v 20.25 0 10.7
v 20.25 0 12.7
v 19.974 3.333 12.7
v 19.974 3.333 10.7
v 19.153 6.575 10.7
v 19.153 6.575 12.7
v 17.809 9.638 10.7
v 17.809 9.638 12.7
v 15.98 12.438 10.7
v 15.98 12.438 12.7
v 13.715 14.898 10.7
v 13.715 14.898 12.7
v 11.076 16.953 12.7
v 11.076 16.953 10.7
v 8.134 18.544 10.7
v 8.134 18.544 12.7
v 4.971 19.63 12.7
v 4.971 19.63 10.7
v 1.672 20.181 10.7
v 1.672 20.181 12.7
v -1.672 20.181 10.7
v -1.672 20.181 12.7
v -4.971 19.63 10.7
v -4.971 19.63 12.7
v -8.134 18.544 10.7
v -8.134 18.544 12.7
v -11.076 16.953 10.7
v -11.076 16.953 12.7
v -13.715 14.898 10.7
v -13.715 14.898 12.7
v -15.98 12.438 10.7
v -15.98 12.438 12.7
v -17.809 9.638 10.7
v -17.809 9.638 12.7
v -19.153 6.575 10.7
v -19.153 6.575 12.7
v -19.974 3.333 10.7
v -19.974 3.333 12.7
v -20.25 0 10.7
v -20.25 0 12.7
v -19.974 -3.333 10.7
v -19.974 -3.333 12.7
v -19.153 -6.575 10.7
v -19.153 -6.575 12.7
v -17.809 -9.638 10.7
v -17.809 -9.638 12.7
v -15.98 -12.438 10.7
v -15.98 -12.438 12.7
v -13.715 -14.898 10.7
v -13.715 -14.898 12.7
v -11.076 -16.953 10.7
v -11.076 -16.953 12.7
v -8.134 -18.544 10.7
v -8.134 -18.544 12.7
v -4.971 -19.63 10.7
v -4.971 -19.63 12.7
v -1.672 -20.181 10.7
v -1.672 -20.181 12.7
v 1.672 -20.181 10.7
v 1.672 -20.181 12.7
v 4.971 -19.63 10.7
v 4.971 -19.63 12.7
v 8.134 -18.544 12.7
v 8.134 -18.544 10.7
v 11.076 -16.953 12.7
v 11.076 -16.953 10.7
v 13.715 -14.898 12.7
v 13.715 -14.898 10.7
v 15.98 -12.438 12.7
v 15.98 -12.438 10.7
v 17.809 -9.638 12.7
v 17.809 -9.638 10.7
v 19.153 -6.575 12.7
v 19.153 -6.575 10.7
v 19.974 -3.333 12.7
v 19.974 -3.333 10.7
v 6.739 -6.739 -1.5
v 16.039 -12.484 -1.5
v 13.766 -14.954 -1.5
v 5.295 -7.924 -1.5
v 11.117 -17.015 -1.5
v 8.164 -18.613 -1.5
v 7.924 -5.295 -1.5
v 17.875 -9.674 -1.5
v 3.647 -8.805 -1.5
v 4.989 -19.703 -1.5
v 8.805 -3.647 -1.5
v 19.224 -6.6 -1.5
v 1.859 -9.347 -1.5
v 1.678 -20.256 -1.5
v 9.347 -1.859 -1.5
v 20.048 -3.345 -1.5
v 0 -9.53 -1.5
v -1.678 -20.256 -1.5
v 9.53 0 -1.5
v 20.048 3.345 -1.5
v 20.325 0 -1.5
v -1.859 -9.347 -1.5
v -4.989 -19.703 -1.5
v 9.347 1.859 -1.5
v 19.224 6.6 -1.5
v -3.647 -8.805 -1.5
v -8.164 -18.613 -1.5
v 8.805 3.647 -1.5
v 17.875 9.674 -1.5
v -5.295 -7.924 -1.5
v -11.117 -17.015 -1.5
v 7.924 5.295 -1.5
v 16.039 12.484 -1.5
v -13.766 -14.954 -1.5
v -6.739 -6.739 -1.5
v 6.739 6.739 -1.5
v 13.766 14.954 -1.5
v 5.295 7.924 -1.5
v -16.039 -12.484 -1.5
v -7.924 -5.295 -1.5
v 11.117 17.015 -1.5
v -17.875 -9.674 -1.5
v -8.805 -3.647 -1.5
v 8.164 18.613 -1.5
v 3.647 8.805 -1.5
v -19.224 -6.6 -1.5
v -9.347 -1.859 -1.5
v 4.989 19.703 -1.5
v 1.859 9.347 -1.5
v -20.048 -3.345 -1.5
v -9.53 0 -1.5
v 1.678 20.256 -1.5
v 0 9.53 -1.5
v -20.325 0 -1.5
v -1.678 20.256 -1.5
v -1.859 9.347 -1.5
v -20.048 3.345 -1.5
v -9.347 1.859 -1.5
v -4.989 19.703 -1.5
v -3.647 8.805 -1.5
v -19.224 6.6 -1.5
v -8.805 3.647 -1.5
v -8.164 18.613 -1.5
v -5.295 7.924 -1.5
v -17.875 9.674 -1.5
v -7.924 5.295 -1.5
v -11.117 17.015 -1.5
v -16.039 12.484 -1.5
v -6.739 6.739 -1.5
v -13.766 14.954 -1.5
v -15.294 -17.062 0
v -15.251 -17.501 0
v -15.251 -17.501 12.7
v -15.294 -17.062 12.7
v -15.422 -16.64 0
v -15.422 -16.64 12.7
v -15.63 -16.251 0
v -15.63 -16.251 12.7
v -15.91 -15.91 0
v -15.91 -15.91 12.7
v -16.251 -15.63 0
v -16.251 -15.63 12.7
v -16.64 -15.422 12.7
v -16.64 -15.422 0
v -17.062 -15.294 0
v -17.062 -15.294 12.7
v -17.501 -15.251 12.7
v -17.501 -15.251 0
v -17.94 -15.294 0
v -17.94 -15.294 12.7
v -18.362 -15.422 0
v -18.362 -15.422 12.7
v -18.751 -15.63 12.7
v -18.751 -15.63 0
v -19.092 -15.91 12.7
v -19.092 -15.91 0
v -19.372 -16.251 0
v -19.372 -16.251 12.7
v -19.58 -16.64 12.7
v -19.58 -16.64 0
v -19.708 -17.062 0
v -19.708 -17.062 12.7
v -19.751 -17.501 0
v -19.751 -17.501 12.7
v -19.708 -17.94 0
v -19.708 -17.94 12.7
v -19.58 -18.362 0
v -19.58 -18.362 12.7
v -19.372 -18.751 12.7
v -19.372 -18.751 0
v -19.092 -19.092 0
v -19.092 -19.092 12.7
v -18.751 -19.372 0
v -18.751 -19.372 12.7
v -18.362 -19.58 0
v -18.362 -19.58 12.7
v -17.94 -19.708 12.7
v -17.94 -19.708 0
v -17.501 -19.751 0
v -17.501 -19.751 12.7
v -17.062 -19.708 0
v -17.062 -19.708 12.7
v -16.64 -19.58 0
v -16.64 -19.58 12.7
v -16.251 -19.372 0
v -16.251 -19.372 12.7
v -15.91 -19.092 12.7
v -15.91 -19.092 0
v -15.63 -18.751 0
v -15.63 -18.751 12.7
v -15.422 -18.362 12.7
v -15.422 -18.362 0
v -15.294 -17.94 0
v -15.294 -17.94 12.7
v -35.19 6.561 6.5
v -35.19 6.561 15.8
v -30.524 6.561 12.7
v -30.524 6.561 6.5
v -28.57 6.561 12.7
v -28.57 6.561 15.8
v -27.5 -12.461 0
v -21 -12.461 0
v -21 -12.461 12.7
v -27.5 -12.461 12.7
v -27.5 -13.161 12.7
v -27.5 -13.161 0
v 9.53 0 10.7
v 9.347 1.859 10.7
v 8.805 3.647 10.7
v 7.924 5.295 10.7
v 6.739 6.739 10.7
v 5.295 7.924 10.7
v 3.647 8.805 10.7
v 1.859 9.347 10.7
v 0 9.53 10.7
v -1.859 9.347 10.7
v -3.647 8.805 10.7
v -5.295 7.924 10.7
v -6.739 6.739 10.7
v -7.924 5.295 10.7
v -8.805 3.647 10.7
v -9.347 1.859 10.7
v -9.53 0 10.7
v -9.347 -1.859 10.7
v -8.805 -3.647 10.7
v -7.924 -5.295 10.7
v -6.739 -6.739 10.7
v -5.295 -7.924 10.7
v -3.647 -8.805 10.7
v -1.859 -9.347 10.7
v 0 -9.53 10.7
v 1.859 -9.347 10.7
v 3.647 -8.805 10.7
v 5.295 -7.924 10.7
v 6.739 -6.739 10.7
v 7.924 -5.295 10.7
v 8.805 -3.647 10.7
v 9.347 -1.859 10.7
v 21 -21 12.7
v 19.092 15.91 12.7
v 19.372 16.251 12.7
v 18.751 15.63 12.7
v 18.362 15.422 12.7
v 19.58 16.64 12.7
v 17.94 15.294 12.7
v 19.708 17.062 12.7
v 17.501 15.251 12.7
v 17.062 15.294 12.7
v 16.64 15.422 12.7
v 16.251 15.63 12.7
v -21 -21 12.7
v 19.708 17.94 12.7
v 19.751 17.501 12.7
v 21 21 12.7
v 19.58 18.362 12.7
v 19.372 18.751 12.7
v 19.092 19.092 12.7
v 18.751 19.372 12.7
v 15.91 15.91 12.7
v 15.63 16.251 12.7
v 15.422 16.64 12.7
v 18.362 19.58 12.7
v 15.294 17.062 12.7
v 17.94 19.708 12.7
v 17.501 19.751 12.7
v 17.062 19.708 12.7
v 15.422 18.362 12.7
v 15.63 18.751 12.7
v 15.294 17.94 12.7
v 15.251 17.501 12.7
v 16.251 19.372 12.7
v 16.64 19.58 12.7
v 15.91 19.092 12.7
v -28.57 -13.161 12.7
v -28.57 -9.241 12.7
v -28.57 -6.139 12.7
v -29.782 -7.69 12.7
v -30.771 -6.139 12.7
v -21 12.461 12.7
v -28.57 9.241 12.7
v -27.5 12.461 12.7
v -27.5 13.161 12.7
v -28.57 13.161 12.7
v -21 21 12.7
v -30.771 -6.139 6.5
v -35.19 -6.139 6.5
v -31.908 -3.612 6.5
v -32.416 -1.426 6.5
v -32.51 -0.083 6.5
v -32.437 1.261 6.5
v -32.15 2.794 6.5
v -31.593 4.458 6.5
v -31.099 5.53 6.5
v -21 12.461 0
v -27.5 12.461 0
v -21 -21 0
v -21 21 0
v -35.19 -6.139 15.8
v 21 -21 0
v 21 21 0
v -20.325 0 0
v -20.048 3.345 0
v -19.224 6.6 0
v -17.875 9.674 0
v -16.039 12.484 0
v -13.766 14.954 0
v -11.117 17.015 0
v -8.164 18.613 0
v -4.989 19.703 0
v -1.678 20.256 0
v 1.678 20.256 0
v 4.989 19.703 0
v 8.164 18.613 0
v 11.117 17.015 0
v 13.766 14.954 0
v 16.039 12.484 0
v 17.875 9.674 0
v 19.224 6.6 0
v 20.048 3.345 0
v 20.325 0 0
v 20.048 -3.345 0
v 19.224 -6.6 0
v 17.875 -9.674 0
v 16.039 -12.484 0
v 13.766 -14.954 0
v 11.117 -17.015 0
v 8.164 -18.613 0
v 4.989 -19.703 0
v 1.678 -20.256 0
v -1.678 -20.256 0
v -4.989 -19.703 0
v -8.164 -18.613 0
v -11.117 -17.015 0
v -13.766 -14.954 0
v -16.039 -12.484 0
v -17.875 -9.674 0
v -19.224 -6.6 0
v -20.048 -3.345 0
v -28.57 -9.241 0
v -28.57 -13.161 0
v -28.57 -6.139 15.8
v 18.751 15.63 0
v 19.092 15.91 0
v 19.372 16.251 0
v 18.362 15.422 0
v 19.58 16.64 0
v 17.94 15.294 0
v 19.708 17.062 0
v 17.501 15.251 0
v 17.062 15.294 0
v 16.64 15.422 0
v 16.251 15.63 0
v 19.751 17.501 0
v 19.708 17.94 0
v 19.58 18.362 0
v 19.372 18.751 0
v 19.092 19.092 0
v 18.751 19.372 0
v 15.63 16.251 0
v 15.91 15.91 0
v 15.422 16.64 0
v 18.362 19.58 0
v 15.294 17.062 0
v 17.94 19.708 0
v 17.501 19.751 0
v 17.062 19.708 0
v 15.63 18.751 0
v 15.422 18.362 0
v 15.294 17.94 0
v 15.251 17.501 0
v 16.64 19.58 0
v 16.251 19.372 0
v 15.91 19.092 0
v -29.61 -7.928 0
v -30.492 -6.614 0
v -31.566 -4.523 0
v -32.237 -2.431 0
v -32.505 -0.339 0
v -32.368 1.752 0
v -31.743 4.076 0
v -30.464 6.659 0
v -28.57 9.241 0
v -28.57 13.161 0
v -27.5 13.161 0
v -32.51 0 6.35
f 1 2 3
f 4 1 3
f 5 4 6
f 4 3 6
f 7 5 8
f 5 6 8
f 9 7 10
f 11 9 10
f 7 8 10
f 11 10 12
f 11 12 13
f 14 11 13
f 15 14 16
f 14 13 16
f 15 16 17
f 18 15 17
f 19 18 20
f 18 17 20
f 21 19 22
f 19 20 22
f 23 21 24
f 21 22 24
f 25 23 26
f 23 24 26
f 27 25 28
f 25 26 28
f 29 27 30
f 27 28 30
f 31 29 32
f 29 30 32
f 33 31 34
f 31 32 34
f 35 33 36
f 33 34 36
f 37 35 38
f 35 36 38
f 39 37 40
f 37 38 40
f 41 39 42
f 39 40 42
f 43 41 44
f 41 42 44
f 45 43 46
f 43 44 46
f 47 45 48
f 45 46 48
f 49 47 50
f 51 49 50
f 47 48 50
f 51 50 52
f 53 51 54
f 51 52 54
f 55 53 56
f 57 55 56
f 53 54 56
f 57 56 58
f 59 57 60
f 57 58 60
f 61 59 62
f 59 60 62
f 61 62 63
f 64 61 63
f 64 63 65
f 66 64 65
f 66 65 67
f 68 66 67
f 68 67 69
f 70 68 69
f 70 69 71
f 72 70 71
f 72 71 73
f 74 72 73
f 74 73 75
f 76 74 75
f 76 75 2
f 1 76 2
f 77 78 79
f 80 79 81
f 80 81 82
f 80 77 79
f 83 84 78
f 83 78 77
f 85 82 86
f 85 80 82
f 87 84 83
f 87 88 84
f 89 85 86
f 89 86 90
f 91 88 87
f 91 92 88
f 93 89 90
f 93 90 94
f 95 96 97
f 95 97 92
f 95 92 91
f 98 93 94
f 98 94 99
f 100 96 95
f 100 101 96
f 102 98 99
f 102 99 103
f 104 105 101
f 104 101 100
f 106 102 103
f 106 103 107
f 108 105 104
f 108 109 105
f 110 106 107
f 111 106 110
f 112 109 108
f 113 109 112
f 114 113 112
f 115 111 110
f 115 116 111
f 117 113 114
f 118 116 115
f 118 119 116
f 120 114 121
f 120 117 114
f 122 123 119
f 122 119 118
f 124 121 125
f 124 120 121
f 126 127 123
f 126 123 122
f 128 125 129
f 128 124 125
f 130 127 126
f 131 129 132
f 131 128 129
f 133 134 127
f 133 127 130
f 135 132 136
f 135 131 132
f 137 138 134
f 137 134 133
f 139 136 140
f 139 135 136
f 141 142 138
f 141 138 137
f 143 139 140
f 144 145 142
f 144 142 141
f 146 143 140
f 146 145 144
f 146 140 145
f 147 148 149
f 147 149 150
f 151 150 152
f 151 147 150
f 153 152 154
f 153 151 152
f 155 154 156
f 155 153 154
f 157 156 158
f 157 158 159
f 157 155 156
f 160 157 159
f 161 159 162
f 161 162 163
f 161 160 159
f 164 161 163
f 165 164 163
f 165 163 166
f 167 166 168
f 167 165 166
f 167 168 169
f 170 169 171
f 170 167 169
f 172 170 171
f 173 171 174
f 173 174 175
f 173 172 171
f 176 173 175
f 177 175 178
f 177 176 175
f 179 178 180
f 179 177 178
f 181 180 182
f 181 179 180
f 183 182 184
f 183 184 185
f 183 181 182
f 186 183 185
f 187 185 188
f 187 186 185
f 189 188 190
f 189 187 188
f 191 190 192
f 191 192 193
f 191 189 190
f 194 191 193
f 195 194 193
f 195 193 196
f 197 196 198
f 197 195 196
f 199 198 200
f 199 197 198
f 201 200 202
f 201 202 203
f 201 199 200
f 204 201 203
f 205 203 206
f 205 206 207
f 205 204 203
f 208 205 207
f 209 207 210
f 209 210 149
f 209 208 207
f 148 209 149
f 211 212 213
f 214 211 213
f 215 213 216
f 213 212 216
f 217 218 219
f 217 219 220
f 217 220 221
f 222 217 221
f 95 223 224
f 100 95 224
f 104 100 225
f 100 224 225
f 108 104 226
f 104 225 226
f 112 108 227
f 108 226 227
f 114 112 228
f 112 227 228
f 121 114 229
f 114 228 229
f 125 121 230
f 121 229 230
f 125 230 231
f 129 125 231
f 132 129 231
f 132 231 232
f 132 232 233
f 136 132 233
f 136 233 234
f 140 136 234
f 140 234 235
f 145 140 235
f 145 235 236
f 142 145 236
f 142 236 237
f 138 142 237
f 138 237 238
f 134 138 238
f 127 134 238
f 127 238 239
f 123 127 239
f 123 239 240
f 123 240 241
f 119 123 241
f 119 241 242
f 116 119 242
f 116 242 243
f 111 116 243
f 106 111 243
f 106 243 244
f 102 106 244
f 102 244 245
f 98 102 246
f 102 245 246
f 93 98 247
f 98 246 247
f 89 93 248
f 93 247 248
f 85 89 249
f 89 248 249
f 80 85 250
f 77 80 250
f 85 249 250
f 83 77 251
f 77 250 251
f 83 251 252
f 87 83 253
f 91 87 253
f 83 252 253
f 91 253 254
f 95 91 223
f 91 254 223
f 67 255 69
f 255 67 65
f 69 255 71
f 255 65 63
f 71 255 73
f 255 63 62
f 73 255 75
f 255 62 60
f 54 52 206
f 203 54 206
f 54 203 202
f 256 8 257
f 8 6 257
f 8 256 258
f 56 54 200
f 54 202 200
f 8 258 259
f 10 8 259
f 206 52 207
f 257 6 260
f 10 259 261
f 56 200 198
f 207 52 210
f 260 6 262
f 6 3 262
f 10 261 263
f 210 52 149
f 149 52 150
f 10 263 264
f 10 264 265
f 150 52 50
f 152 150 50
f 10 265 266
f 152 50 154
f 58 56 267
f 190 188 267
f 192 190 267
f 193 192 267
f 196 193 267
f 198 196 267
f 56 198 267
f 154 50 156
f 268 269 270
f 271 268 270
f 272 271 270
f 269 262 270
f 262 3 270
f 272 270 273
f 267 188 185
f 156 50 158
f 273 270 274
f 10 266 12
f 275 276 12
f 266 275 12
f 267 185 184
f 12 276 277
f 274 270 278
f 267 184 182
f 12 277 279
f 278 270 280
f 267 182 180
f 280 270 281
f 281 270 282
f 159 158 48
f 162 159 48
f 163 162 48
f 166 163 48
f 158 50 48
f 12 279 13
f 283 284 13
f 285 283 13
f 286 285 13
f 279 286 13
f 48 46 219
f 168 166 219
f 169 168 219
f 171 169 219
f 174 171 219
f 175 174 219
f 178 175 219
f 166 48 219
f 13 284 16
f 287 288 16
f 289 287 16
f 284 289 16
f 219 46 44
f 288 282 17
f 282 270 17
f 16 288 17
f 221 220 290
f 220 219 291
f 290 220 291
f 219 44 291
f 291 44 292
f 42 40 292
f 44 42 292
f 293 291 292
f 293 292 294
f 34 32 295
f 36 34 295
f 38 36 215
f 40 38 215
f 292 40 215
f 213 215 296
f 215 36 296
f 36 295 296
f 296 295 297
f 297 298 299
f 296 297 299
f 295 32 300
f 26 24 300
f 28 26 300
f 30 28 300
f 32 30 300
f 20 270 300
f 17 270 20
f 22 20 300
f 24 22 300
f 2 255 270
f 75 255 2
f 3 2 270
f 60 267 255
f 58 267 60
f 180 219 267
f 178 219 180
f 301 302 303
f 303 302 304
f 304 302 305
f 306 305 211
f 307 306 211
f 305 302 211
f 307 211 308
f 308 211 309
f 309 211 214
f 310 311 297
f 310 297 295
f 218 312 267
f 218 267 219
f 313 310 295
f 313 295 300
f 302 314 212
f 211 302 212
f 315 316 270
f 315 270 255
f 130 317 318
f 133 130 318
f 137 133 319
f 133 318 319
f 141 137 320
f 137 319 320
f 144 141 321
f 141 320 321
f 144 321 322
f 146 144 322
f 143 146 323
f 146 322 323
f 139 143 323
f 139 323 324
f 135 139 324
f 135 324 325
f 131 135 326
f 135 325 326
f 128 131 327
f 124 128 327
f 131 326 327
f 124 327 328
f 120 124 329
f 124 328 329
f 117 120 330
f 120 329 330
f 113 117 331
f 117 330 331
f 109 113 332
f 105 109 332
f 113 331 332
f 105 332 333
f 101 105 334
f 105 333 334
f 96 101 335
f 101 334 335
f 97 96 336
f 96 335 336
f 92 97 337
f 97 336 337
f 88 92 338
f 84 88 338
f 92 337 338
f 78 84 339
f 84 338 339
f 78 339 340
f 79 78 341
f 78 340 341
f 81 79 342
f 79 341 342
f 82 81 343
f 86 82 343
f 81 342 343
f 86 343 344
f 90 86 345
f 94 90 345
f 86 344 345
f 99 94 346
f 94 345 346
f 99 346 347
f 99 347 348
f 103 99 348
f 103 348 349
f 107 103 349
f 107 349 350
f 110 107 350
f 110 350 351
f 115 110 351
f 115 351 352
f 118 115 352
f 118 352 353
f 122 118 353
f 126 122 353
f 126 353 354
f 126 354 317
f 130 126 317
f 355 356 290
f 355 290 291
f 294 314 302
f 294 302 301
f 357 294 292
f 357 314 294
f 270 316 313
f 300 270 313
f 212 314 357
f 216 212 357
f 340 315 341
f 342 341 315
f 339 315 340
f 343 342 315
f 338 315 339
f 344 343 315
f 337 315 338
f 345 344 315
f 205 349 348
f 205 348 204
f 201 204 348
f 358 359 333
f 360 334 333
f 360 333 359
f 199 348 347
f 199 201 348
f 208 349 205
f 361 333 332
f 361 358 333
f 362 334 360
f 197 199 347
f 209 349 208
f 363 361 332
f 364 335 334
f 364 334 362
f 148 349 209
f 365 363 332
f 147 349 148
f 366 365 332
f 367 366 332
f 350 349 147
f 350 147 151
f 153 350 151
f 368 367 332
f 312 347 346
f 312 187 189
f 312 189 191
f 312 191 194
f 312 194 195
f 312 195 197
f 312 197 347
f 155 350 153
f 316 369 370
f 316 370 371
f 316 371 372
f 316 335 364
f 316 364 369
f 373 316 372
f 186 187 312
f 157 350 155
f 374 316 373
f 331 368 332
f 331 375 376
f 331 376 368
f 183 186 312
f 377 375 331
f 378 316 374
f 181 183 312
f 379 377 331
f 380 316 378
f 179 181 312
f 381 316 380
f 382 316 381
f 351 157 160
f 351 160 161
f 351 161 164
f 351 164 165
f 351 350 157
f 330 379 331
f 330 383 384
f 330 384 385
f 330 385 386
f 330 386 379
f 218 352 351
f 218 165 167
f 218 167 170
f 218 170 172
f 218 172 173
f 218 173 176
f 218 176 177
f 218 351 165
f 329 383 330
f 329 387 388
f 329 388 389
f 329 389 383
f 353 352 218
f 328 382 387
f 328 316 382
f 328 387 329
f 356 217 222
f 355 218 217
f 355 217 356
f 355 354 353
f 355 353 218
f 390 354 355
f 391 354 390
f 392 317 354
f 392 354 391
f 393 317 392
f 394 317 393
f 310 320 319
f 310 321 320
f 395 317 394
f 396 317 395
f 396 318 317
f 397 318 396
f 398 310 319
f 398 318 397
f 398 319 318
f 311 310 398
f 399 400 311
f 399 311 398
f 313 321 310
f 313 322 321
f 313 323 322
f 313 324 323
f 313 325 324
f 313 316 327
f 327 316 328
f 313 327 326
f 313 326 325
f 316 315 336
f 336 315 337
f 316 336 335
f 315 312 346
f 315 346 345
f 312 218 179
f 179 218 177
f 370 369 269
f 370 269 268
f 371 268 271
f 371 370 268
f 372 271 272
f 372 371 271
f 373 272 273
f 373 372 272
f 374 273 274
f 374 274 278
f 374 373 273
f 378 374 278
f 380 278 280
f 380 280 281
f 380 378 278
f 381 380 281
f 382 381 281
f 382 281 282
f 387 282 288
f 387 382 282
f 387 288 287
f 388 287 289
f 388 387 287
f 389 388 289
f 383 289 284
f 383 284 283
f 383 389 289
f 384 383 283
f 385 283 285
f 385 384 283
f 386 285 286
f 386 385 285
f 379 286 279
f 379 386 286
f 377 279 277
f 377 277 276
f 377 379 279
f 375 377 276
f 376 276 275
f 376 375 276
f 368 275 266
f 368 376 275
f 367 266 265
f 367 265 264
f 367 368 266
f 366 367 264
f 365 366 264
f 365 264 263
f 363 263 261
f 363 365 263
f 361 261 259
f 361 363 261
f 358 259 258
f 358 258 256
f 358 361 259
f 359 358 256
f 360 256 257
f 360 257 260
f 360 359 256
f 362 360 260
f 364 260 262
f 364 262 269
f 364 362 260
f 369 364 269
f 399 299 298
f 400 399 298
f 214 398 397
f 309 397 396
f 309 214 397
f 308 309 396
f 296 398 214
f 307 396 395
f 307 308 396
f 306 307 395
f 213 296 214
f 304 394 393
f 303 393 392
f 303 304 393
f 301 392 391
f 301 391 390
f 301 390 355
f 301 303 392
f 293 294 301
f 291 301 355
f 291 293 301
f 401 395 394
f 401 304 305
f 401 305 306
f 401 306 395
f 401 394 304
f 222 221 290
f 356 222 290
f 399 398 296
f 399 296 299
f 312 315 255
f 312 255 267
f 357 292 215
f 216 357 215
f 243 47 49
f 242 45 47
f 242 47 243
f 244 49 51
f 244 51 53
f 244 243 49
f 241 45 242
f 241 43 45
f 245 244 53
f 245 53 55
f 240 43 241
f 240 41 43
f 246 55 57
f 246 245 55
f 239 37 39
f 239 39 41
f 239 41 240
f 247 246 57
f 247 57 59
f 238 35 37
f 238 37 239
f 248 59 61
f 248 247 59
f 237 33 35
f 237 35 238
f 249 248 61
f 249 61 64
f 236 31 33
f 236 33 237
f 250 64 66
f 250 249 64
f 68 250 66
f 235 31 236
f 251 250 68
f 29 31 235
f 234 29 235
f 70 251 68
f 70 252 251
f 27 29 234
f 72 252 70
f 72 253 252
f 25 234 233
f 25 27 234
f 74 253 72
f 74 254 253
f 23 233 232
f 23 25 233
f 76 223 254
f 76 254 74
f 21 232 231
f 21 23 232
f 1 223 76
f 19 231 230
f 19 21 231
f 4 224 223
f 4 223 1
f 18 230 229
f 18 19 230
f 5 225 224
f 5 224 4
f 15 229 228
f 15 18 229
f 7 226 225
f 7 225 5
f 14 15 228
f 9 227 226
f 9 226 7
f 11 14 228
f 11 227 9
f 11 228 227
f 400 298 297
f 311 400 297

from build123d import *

# Parameters (mm, degrees)
BOSS_EXTRUDE1_DEPTH      = 12.7
SKETCH2_R                = 2.25
CUT_EXTRUDE1_DEPTH       = 12.7
BOSS_EXTRUDE4_DEPTH      = 12.7
SKETCH4_R                = 20.25
CUT_EXTRUDE2_DEPTH       = 2
SKETCH6_R                = 20.325
BOSS_EXTRUDE5_DEPTH      = 1.5
SKETCH5_R                = 9.53
CUT_EXTRUDE3_DEPTH       = 30
SKETCH8_W                = 6.62
SKETCH8_H                = 12.7
BOSS_EXTRUDE7_DEPTH      = 3.1
BOSS_EXTRUDE7_DEPTH_BACK = 6.2


with BuildPart() as part:
    # Sketch1 → Boss-Extrude1 (new body)
    with BuildSketch(Plane.XY):
        Polygon((0, 21), (21, 21), (21, -21), (-21, -21), (-21, 21), align=None)
    extrude(amount=BOSS_EXTRUDE1_DEPTH)

    # Sketch2 → Cut-Extrude1 (cut)
    with BuildSketch(Plane.XY):
        with Locations((17.500892834, 17.500892834)):
            Circle(SKETCH2_R)
        with Locations((-17.500892834, -17.500892834)):
            Circle(SKETCH2_R)
    extrude(amount=CUT_EXTRUDE1_DEPTH, mode=Mode.SUBTRACT)

    # Sketch3 → Boss-Extrude4 (add)
    with BuildSketch(Plane.XY.offset(12.7)):
        with BuildLine():
            Line((-21, -12.460892834), (-27.5, -12.460892834))
            Line((-27.5, -12.460892834), (-27.5, -13.160892834))
            Line((-27.5, -13.160892834), (-28.57, -13.160892834))
            Line((-28.57, -13.160892834), (-28.57, -9.240892834))
            add(Edge.make_bspline(
                [(-28.57, 9.240892834), (-36.45, 0), (-28.57, -9.240892834)],
                knots=[0, 0, 0, 1, 1, 1], degree=2))
            Line((-28.57, 9.240892834), (-28.57, 13.160892834))
            Line((-28.57, 13.160892834), (-27.5, 13.160892834))
            Line((-27.5, 13.160892834), (-27.5, 12.460892834))
            Line((-27.5, 12.460892834), (-21, 12.460892834))
            Line((-21, 12.460892834), (-21, -12.460892834))
        make_face()
    extrude(amount=-BOSS_EXTRUDE4_DEPTH)

    # Sketch4 → Cut-Extrude2 (cut)
    with BuildSketch(Plane.XY.offset(12.7)):
        Circle(SKETCH4_R)
    extrude(amount=-CUT_EXTRUDE2_DEPTH, mode=Mode.SUBTRACT)

    # Sketch6 → Boss-Extrude5 (add)
    with BuildSketch(Plane(origin=(0, 0, 0), x_dir=(-1, 0, 0), z_dir=(0, 0, -1))):
        Circle(SKETCH6_R)
    extrude(amount=BOSS_EXTRUDE5_DEPTH)

    # Sketch5 → Cut-Extrude3 (cut)
    with BuildSketch(Plane.XY.offset(10.7)):
        Circle(SKETCH5_R)
    extrude(amount=-CUT_EXTRUDE3_DEPTH, mode=Mode.SUBTRACT)

    # Sketch8 → Boss-Extrude7 (add, two sides)
    with BuildSketch(Plane.XY.offset(12.7)) as boss_extrude7_sk:
        with Locations((-31.88, 0.210892834)):
            Rectangle(SKETCH8_W, SKETCH8_H)
    extrude(amount=BOSS_EXTRUDE7_DEPTH)
    extrude(boss_extrude7_sk.sketch, amount=-BOSS_EXTRUDE7_DEPTH_BACK)


solid = part.part
